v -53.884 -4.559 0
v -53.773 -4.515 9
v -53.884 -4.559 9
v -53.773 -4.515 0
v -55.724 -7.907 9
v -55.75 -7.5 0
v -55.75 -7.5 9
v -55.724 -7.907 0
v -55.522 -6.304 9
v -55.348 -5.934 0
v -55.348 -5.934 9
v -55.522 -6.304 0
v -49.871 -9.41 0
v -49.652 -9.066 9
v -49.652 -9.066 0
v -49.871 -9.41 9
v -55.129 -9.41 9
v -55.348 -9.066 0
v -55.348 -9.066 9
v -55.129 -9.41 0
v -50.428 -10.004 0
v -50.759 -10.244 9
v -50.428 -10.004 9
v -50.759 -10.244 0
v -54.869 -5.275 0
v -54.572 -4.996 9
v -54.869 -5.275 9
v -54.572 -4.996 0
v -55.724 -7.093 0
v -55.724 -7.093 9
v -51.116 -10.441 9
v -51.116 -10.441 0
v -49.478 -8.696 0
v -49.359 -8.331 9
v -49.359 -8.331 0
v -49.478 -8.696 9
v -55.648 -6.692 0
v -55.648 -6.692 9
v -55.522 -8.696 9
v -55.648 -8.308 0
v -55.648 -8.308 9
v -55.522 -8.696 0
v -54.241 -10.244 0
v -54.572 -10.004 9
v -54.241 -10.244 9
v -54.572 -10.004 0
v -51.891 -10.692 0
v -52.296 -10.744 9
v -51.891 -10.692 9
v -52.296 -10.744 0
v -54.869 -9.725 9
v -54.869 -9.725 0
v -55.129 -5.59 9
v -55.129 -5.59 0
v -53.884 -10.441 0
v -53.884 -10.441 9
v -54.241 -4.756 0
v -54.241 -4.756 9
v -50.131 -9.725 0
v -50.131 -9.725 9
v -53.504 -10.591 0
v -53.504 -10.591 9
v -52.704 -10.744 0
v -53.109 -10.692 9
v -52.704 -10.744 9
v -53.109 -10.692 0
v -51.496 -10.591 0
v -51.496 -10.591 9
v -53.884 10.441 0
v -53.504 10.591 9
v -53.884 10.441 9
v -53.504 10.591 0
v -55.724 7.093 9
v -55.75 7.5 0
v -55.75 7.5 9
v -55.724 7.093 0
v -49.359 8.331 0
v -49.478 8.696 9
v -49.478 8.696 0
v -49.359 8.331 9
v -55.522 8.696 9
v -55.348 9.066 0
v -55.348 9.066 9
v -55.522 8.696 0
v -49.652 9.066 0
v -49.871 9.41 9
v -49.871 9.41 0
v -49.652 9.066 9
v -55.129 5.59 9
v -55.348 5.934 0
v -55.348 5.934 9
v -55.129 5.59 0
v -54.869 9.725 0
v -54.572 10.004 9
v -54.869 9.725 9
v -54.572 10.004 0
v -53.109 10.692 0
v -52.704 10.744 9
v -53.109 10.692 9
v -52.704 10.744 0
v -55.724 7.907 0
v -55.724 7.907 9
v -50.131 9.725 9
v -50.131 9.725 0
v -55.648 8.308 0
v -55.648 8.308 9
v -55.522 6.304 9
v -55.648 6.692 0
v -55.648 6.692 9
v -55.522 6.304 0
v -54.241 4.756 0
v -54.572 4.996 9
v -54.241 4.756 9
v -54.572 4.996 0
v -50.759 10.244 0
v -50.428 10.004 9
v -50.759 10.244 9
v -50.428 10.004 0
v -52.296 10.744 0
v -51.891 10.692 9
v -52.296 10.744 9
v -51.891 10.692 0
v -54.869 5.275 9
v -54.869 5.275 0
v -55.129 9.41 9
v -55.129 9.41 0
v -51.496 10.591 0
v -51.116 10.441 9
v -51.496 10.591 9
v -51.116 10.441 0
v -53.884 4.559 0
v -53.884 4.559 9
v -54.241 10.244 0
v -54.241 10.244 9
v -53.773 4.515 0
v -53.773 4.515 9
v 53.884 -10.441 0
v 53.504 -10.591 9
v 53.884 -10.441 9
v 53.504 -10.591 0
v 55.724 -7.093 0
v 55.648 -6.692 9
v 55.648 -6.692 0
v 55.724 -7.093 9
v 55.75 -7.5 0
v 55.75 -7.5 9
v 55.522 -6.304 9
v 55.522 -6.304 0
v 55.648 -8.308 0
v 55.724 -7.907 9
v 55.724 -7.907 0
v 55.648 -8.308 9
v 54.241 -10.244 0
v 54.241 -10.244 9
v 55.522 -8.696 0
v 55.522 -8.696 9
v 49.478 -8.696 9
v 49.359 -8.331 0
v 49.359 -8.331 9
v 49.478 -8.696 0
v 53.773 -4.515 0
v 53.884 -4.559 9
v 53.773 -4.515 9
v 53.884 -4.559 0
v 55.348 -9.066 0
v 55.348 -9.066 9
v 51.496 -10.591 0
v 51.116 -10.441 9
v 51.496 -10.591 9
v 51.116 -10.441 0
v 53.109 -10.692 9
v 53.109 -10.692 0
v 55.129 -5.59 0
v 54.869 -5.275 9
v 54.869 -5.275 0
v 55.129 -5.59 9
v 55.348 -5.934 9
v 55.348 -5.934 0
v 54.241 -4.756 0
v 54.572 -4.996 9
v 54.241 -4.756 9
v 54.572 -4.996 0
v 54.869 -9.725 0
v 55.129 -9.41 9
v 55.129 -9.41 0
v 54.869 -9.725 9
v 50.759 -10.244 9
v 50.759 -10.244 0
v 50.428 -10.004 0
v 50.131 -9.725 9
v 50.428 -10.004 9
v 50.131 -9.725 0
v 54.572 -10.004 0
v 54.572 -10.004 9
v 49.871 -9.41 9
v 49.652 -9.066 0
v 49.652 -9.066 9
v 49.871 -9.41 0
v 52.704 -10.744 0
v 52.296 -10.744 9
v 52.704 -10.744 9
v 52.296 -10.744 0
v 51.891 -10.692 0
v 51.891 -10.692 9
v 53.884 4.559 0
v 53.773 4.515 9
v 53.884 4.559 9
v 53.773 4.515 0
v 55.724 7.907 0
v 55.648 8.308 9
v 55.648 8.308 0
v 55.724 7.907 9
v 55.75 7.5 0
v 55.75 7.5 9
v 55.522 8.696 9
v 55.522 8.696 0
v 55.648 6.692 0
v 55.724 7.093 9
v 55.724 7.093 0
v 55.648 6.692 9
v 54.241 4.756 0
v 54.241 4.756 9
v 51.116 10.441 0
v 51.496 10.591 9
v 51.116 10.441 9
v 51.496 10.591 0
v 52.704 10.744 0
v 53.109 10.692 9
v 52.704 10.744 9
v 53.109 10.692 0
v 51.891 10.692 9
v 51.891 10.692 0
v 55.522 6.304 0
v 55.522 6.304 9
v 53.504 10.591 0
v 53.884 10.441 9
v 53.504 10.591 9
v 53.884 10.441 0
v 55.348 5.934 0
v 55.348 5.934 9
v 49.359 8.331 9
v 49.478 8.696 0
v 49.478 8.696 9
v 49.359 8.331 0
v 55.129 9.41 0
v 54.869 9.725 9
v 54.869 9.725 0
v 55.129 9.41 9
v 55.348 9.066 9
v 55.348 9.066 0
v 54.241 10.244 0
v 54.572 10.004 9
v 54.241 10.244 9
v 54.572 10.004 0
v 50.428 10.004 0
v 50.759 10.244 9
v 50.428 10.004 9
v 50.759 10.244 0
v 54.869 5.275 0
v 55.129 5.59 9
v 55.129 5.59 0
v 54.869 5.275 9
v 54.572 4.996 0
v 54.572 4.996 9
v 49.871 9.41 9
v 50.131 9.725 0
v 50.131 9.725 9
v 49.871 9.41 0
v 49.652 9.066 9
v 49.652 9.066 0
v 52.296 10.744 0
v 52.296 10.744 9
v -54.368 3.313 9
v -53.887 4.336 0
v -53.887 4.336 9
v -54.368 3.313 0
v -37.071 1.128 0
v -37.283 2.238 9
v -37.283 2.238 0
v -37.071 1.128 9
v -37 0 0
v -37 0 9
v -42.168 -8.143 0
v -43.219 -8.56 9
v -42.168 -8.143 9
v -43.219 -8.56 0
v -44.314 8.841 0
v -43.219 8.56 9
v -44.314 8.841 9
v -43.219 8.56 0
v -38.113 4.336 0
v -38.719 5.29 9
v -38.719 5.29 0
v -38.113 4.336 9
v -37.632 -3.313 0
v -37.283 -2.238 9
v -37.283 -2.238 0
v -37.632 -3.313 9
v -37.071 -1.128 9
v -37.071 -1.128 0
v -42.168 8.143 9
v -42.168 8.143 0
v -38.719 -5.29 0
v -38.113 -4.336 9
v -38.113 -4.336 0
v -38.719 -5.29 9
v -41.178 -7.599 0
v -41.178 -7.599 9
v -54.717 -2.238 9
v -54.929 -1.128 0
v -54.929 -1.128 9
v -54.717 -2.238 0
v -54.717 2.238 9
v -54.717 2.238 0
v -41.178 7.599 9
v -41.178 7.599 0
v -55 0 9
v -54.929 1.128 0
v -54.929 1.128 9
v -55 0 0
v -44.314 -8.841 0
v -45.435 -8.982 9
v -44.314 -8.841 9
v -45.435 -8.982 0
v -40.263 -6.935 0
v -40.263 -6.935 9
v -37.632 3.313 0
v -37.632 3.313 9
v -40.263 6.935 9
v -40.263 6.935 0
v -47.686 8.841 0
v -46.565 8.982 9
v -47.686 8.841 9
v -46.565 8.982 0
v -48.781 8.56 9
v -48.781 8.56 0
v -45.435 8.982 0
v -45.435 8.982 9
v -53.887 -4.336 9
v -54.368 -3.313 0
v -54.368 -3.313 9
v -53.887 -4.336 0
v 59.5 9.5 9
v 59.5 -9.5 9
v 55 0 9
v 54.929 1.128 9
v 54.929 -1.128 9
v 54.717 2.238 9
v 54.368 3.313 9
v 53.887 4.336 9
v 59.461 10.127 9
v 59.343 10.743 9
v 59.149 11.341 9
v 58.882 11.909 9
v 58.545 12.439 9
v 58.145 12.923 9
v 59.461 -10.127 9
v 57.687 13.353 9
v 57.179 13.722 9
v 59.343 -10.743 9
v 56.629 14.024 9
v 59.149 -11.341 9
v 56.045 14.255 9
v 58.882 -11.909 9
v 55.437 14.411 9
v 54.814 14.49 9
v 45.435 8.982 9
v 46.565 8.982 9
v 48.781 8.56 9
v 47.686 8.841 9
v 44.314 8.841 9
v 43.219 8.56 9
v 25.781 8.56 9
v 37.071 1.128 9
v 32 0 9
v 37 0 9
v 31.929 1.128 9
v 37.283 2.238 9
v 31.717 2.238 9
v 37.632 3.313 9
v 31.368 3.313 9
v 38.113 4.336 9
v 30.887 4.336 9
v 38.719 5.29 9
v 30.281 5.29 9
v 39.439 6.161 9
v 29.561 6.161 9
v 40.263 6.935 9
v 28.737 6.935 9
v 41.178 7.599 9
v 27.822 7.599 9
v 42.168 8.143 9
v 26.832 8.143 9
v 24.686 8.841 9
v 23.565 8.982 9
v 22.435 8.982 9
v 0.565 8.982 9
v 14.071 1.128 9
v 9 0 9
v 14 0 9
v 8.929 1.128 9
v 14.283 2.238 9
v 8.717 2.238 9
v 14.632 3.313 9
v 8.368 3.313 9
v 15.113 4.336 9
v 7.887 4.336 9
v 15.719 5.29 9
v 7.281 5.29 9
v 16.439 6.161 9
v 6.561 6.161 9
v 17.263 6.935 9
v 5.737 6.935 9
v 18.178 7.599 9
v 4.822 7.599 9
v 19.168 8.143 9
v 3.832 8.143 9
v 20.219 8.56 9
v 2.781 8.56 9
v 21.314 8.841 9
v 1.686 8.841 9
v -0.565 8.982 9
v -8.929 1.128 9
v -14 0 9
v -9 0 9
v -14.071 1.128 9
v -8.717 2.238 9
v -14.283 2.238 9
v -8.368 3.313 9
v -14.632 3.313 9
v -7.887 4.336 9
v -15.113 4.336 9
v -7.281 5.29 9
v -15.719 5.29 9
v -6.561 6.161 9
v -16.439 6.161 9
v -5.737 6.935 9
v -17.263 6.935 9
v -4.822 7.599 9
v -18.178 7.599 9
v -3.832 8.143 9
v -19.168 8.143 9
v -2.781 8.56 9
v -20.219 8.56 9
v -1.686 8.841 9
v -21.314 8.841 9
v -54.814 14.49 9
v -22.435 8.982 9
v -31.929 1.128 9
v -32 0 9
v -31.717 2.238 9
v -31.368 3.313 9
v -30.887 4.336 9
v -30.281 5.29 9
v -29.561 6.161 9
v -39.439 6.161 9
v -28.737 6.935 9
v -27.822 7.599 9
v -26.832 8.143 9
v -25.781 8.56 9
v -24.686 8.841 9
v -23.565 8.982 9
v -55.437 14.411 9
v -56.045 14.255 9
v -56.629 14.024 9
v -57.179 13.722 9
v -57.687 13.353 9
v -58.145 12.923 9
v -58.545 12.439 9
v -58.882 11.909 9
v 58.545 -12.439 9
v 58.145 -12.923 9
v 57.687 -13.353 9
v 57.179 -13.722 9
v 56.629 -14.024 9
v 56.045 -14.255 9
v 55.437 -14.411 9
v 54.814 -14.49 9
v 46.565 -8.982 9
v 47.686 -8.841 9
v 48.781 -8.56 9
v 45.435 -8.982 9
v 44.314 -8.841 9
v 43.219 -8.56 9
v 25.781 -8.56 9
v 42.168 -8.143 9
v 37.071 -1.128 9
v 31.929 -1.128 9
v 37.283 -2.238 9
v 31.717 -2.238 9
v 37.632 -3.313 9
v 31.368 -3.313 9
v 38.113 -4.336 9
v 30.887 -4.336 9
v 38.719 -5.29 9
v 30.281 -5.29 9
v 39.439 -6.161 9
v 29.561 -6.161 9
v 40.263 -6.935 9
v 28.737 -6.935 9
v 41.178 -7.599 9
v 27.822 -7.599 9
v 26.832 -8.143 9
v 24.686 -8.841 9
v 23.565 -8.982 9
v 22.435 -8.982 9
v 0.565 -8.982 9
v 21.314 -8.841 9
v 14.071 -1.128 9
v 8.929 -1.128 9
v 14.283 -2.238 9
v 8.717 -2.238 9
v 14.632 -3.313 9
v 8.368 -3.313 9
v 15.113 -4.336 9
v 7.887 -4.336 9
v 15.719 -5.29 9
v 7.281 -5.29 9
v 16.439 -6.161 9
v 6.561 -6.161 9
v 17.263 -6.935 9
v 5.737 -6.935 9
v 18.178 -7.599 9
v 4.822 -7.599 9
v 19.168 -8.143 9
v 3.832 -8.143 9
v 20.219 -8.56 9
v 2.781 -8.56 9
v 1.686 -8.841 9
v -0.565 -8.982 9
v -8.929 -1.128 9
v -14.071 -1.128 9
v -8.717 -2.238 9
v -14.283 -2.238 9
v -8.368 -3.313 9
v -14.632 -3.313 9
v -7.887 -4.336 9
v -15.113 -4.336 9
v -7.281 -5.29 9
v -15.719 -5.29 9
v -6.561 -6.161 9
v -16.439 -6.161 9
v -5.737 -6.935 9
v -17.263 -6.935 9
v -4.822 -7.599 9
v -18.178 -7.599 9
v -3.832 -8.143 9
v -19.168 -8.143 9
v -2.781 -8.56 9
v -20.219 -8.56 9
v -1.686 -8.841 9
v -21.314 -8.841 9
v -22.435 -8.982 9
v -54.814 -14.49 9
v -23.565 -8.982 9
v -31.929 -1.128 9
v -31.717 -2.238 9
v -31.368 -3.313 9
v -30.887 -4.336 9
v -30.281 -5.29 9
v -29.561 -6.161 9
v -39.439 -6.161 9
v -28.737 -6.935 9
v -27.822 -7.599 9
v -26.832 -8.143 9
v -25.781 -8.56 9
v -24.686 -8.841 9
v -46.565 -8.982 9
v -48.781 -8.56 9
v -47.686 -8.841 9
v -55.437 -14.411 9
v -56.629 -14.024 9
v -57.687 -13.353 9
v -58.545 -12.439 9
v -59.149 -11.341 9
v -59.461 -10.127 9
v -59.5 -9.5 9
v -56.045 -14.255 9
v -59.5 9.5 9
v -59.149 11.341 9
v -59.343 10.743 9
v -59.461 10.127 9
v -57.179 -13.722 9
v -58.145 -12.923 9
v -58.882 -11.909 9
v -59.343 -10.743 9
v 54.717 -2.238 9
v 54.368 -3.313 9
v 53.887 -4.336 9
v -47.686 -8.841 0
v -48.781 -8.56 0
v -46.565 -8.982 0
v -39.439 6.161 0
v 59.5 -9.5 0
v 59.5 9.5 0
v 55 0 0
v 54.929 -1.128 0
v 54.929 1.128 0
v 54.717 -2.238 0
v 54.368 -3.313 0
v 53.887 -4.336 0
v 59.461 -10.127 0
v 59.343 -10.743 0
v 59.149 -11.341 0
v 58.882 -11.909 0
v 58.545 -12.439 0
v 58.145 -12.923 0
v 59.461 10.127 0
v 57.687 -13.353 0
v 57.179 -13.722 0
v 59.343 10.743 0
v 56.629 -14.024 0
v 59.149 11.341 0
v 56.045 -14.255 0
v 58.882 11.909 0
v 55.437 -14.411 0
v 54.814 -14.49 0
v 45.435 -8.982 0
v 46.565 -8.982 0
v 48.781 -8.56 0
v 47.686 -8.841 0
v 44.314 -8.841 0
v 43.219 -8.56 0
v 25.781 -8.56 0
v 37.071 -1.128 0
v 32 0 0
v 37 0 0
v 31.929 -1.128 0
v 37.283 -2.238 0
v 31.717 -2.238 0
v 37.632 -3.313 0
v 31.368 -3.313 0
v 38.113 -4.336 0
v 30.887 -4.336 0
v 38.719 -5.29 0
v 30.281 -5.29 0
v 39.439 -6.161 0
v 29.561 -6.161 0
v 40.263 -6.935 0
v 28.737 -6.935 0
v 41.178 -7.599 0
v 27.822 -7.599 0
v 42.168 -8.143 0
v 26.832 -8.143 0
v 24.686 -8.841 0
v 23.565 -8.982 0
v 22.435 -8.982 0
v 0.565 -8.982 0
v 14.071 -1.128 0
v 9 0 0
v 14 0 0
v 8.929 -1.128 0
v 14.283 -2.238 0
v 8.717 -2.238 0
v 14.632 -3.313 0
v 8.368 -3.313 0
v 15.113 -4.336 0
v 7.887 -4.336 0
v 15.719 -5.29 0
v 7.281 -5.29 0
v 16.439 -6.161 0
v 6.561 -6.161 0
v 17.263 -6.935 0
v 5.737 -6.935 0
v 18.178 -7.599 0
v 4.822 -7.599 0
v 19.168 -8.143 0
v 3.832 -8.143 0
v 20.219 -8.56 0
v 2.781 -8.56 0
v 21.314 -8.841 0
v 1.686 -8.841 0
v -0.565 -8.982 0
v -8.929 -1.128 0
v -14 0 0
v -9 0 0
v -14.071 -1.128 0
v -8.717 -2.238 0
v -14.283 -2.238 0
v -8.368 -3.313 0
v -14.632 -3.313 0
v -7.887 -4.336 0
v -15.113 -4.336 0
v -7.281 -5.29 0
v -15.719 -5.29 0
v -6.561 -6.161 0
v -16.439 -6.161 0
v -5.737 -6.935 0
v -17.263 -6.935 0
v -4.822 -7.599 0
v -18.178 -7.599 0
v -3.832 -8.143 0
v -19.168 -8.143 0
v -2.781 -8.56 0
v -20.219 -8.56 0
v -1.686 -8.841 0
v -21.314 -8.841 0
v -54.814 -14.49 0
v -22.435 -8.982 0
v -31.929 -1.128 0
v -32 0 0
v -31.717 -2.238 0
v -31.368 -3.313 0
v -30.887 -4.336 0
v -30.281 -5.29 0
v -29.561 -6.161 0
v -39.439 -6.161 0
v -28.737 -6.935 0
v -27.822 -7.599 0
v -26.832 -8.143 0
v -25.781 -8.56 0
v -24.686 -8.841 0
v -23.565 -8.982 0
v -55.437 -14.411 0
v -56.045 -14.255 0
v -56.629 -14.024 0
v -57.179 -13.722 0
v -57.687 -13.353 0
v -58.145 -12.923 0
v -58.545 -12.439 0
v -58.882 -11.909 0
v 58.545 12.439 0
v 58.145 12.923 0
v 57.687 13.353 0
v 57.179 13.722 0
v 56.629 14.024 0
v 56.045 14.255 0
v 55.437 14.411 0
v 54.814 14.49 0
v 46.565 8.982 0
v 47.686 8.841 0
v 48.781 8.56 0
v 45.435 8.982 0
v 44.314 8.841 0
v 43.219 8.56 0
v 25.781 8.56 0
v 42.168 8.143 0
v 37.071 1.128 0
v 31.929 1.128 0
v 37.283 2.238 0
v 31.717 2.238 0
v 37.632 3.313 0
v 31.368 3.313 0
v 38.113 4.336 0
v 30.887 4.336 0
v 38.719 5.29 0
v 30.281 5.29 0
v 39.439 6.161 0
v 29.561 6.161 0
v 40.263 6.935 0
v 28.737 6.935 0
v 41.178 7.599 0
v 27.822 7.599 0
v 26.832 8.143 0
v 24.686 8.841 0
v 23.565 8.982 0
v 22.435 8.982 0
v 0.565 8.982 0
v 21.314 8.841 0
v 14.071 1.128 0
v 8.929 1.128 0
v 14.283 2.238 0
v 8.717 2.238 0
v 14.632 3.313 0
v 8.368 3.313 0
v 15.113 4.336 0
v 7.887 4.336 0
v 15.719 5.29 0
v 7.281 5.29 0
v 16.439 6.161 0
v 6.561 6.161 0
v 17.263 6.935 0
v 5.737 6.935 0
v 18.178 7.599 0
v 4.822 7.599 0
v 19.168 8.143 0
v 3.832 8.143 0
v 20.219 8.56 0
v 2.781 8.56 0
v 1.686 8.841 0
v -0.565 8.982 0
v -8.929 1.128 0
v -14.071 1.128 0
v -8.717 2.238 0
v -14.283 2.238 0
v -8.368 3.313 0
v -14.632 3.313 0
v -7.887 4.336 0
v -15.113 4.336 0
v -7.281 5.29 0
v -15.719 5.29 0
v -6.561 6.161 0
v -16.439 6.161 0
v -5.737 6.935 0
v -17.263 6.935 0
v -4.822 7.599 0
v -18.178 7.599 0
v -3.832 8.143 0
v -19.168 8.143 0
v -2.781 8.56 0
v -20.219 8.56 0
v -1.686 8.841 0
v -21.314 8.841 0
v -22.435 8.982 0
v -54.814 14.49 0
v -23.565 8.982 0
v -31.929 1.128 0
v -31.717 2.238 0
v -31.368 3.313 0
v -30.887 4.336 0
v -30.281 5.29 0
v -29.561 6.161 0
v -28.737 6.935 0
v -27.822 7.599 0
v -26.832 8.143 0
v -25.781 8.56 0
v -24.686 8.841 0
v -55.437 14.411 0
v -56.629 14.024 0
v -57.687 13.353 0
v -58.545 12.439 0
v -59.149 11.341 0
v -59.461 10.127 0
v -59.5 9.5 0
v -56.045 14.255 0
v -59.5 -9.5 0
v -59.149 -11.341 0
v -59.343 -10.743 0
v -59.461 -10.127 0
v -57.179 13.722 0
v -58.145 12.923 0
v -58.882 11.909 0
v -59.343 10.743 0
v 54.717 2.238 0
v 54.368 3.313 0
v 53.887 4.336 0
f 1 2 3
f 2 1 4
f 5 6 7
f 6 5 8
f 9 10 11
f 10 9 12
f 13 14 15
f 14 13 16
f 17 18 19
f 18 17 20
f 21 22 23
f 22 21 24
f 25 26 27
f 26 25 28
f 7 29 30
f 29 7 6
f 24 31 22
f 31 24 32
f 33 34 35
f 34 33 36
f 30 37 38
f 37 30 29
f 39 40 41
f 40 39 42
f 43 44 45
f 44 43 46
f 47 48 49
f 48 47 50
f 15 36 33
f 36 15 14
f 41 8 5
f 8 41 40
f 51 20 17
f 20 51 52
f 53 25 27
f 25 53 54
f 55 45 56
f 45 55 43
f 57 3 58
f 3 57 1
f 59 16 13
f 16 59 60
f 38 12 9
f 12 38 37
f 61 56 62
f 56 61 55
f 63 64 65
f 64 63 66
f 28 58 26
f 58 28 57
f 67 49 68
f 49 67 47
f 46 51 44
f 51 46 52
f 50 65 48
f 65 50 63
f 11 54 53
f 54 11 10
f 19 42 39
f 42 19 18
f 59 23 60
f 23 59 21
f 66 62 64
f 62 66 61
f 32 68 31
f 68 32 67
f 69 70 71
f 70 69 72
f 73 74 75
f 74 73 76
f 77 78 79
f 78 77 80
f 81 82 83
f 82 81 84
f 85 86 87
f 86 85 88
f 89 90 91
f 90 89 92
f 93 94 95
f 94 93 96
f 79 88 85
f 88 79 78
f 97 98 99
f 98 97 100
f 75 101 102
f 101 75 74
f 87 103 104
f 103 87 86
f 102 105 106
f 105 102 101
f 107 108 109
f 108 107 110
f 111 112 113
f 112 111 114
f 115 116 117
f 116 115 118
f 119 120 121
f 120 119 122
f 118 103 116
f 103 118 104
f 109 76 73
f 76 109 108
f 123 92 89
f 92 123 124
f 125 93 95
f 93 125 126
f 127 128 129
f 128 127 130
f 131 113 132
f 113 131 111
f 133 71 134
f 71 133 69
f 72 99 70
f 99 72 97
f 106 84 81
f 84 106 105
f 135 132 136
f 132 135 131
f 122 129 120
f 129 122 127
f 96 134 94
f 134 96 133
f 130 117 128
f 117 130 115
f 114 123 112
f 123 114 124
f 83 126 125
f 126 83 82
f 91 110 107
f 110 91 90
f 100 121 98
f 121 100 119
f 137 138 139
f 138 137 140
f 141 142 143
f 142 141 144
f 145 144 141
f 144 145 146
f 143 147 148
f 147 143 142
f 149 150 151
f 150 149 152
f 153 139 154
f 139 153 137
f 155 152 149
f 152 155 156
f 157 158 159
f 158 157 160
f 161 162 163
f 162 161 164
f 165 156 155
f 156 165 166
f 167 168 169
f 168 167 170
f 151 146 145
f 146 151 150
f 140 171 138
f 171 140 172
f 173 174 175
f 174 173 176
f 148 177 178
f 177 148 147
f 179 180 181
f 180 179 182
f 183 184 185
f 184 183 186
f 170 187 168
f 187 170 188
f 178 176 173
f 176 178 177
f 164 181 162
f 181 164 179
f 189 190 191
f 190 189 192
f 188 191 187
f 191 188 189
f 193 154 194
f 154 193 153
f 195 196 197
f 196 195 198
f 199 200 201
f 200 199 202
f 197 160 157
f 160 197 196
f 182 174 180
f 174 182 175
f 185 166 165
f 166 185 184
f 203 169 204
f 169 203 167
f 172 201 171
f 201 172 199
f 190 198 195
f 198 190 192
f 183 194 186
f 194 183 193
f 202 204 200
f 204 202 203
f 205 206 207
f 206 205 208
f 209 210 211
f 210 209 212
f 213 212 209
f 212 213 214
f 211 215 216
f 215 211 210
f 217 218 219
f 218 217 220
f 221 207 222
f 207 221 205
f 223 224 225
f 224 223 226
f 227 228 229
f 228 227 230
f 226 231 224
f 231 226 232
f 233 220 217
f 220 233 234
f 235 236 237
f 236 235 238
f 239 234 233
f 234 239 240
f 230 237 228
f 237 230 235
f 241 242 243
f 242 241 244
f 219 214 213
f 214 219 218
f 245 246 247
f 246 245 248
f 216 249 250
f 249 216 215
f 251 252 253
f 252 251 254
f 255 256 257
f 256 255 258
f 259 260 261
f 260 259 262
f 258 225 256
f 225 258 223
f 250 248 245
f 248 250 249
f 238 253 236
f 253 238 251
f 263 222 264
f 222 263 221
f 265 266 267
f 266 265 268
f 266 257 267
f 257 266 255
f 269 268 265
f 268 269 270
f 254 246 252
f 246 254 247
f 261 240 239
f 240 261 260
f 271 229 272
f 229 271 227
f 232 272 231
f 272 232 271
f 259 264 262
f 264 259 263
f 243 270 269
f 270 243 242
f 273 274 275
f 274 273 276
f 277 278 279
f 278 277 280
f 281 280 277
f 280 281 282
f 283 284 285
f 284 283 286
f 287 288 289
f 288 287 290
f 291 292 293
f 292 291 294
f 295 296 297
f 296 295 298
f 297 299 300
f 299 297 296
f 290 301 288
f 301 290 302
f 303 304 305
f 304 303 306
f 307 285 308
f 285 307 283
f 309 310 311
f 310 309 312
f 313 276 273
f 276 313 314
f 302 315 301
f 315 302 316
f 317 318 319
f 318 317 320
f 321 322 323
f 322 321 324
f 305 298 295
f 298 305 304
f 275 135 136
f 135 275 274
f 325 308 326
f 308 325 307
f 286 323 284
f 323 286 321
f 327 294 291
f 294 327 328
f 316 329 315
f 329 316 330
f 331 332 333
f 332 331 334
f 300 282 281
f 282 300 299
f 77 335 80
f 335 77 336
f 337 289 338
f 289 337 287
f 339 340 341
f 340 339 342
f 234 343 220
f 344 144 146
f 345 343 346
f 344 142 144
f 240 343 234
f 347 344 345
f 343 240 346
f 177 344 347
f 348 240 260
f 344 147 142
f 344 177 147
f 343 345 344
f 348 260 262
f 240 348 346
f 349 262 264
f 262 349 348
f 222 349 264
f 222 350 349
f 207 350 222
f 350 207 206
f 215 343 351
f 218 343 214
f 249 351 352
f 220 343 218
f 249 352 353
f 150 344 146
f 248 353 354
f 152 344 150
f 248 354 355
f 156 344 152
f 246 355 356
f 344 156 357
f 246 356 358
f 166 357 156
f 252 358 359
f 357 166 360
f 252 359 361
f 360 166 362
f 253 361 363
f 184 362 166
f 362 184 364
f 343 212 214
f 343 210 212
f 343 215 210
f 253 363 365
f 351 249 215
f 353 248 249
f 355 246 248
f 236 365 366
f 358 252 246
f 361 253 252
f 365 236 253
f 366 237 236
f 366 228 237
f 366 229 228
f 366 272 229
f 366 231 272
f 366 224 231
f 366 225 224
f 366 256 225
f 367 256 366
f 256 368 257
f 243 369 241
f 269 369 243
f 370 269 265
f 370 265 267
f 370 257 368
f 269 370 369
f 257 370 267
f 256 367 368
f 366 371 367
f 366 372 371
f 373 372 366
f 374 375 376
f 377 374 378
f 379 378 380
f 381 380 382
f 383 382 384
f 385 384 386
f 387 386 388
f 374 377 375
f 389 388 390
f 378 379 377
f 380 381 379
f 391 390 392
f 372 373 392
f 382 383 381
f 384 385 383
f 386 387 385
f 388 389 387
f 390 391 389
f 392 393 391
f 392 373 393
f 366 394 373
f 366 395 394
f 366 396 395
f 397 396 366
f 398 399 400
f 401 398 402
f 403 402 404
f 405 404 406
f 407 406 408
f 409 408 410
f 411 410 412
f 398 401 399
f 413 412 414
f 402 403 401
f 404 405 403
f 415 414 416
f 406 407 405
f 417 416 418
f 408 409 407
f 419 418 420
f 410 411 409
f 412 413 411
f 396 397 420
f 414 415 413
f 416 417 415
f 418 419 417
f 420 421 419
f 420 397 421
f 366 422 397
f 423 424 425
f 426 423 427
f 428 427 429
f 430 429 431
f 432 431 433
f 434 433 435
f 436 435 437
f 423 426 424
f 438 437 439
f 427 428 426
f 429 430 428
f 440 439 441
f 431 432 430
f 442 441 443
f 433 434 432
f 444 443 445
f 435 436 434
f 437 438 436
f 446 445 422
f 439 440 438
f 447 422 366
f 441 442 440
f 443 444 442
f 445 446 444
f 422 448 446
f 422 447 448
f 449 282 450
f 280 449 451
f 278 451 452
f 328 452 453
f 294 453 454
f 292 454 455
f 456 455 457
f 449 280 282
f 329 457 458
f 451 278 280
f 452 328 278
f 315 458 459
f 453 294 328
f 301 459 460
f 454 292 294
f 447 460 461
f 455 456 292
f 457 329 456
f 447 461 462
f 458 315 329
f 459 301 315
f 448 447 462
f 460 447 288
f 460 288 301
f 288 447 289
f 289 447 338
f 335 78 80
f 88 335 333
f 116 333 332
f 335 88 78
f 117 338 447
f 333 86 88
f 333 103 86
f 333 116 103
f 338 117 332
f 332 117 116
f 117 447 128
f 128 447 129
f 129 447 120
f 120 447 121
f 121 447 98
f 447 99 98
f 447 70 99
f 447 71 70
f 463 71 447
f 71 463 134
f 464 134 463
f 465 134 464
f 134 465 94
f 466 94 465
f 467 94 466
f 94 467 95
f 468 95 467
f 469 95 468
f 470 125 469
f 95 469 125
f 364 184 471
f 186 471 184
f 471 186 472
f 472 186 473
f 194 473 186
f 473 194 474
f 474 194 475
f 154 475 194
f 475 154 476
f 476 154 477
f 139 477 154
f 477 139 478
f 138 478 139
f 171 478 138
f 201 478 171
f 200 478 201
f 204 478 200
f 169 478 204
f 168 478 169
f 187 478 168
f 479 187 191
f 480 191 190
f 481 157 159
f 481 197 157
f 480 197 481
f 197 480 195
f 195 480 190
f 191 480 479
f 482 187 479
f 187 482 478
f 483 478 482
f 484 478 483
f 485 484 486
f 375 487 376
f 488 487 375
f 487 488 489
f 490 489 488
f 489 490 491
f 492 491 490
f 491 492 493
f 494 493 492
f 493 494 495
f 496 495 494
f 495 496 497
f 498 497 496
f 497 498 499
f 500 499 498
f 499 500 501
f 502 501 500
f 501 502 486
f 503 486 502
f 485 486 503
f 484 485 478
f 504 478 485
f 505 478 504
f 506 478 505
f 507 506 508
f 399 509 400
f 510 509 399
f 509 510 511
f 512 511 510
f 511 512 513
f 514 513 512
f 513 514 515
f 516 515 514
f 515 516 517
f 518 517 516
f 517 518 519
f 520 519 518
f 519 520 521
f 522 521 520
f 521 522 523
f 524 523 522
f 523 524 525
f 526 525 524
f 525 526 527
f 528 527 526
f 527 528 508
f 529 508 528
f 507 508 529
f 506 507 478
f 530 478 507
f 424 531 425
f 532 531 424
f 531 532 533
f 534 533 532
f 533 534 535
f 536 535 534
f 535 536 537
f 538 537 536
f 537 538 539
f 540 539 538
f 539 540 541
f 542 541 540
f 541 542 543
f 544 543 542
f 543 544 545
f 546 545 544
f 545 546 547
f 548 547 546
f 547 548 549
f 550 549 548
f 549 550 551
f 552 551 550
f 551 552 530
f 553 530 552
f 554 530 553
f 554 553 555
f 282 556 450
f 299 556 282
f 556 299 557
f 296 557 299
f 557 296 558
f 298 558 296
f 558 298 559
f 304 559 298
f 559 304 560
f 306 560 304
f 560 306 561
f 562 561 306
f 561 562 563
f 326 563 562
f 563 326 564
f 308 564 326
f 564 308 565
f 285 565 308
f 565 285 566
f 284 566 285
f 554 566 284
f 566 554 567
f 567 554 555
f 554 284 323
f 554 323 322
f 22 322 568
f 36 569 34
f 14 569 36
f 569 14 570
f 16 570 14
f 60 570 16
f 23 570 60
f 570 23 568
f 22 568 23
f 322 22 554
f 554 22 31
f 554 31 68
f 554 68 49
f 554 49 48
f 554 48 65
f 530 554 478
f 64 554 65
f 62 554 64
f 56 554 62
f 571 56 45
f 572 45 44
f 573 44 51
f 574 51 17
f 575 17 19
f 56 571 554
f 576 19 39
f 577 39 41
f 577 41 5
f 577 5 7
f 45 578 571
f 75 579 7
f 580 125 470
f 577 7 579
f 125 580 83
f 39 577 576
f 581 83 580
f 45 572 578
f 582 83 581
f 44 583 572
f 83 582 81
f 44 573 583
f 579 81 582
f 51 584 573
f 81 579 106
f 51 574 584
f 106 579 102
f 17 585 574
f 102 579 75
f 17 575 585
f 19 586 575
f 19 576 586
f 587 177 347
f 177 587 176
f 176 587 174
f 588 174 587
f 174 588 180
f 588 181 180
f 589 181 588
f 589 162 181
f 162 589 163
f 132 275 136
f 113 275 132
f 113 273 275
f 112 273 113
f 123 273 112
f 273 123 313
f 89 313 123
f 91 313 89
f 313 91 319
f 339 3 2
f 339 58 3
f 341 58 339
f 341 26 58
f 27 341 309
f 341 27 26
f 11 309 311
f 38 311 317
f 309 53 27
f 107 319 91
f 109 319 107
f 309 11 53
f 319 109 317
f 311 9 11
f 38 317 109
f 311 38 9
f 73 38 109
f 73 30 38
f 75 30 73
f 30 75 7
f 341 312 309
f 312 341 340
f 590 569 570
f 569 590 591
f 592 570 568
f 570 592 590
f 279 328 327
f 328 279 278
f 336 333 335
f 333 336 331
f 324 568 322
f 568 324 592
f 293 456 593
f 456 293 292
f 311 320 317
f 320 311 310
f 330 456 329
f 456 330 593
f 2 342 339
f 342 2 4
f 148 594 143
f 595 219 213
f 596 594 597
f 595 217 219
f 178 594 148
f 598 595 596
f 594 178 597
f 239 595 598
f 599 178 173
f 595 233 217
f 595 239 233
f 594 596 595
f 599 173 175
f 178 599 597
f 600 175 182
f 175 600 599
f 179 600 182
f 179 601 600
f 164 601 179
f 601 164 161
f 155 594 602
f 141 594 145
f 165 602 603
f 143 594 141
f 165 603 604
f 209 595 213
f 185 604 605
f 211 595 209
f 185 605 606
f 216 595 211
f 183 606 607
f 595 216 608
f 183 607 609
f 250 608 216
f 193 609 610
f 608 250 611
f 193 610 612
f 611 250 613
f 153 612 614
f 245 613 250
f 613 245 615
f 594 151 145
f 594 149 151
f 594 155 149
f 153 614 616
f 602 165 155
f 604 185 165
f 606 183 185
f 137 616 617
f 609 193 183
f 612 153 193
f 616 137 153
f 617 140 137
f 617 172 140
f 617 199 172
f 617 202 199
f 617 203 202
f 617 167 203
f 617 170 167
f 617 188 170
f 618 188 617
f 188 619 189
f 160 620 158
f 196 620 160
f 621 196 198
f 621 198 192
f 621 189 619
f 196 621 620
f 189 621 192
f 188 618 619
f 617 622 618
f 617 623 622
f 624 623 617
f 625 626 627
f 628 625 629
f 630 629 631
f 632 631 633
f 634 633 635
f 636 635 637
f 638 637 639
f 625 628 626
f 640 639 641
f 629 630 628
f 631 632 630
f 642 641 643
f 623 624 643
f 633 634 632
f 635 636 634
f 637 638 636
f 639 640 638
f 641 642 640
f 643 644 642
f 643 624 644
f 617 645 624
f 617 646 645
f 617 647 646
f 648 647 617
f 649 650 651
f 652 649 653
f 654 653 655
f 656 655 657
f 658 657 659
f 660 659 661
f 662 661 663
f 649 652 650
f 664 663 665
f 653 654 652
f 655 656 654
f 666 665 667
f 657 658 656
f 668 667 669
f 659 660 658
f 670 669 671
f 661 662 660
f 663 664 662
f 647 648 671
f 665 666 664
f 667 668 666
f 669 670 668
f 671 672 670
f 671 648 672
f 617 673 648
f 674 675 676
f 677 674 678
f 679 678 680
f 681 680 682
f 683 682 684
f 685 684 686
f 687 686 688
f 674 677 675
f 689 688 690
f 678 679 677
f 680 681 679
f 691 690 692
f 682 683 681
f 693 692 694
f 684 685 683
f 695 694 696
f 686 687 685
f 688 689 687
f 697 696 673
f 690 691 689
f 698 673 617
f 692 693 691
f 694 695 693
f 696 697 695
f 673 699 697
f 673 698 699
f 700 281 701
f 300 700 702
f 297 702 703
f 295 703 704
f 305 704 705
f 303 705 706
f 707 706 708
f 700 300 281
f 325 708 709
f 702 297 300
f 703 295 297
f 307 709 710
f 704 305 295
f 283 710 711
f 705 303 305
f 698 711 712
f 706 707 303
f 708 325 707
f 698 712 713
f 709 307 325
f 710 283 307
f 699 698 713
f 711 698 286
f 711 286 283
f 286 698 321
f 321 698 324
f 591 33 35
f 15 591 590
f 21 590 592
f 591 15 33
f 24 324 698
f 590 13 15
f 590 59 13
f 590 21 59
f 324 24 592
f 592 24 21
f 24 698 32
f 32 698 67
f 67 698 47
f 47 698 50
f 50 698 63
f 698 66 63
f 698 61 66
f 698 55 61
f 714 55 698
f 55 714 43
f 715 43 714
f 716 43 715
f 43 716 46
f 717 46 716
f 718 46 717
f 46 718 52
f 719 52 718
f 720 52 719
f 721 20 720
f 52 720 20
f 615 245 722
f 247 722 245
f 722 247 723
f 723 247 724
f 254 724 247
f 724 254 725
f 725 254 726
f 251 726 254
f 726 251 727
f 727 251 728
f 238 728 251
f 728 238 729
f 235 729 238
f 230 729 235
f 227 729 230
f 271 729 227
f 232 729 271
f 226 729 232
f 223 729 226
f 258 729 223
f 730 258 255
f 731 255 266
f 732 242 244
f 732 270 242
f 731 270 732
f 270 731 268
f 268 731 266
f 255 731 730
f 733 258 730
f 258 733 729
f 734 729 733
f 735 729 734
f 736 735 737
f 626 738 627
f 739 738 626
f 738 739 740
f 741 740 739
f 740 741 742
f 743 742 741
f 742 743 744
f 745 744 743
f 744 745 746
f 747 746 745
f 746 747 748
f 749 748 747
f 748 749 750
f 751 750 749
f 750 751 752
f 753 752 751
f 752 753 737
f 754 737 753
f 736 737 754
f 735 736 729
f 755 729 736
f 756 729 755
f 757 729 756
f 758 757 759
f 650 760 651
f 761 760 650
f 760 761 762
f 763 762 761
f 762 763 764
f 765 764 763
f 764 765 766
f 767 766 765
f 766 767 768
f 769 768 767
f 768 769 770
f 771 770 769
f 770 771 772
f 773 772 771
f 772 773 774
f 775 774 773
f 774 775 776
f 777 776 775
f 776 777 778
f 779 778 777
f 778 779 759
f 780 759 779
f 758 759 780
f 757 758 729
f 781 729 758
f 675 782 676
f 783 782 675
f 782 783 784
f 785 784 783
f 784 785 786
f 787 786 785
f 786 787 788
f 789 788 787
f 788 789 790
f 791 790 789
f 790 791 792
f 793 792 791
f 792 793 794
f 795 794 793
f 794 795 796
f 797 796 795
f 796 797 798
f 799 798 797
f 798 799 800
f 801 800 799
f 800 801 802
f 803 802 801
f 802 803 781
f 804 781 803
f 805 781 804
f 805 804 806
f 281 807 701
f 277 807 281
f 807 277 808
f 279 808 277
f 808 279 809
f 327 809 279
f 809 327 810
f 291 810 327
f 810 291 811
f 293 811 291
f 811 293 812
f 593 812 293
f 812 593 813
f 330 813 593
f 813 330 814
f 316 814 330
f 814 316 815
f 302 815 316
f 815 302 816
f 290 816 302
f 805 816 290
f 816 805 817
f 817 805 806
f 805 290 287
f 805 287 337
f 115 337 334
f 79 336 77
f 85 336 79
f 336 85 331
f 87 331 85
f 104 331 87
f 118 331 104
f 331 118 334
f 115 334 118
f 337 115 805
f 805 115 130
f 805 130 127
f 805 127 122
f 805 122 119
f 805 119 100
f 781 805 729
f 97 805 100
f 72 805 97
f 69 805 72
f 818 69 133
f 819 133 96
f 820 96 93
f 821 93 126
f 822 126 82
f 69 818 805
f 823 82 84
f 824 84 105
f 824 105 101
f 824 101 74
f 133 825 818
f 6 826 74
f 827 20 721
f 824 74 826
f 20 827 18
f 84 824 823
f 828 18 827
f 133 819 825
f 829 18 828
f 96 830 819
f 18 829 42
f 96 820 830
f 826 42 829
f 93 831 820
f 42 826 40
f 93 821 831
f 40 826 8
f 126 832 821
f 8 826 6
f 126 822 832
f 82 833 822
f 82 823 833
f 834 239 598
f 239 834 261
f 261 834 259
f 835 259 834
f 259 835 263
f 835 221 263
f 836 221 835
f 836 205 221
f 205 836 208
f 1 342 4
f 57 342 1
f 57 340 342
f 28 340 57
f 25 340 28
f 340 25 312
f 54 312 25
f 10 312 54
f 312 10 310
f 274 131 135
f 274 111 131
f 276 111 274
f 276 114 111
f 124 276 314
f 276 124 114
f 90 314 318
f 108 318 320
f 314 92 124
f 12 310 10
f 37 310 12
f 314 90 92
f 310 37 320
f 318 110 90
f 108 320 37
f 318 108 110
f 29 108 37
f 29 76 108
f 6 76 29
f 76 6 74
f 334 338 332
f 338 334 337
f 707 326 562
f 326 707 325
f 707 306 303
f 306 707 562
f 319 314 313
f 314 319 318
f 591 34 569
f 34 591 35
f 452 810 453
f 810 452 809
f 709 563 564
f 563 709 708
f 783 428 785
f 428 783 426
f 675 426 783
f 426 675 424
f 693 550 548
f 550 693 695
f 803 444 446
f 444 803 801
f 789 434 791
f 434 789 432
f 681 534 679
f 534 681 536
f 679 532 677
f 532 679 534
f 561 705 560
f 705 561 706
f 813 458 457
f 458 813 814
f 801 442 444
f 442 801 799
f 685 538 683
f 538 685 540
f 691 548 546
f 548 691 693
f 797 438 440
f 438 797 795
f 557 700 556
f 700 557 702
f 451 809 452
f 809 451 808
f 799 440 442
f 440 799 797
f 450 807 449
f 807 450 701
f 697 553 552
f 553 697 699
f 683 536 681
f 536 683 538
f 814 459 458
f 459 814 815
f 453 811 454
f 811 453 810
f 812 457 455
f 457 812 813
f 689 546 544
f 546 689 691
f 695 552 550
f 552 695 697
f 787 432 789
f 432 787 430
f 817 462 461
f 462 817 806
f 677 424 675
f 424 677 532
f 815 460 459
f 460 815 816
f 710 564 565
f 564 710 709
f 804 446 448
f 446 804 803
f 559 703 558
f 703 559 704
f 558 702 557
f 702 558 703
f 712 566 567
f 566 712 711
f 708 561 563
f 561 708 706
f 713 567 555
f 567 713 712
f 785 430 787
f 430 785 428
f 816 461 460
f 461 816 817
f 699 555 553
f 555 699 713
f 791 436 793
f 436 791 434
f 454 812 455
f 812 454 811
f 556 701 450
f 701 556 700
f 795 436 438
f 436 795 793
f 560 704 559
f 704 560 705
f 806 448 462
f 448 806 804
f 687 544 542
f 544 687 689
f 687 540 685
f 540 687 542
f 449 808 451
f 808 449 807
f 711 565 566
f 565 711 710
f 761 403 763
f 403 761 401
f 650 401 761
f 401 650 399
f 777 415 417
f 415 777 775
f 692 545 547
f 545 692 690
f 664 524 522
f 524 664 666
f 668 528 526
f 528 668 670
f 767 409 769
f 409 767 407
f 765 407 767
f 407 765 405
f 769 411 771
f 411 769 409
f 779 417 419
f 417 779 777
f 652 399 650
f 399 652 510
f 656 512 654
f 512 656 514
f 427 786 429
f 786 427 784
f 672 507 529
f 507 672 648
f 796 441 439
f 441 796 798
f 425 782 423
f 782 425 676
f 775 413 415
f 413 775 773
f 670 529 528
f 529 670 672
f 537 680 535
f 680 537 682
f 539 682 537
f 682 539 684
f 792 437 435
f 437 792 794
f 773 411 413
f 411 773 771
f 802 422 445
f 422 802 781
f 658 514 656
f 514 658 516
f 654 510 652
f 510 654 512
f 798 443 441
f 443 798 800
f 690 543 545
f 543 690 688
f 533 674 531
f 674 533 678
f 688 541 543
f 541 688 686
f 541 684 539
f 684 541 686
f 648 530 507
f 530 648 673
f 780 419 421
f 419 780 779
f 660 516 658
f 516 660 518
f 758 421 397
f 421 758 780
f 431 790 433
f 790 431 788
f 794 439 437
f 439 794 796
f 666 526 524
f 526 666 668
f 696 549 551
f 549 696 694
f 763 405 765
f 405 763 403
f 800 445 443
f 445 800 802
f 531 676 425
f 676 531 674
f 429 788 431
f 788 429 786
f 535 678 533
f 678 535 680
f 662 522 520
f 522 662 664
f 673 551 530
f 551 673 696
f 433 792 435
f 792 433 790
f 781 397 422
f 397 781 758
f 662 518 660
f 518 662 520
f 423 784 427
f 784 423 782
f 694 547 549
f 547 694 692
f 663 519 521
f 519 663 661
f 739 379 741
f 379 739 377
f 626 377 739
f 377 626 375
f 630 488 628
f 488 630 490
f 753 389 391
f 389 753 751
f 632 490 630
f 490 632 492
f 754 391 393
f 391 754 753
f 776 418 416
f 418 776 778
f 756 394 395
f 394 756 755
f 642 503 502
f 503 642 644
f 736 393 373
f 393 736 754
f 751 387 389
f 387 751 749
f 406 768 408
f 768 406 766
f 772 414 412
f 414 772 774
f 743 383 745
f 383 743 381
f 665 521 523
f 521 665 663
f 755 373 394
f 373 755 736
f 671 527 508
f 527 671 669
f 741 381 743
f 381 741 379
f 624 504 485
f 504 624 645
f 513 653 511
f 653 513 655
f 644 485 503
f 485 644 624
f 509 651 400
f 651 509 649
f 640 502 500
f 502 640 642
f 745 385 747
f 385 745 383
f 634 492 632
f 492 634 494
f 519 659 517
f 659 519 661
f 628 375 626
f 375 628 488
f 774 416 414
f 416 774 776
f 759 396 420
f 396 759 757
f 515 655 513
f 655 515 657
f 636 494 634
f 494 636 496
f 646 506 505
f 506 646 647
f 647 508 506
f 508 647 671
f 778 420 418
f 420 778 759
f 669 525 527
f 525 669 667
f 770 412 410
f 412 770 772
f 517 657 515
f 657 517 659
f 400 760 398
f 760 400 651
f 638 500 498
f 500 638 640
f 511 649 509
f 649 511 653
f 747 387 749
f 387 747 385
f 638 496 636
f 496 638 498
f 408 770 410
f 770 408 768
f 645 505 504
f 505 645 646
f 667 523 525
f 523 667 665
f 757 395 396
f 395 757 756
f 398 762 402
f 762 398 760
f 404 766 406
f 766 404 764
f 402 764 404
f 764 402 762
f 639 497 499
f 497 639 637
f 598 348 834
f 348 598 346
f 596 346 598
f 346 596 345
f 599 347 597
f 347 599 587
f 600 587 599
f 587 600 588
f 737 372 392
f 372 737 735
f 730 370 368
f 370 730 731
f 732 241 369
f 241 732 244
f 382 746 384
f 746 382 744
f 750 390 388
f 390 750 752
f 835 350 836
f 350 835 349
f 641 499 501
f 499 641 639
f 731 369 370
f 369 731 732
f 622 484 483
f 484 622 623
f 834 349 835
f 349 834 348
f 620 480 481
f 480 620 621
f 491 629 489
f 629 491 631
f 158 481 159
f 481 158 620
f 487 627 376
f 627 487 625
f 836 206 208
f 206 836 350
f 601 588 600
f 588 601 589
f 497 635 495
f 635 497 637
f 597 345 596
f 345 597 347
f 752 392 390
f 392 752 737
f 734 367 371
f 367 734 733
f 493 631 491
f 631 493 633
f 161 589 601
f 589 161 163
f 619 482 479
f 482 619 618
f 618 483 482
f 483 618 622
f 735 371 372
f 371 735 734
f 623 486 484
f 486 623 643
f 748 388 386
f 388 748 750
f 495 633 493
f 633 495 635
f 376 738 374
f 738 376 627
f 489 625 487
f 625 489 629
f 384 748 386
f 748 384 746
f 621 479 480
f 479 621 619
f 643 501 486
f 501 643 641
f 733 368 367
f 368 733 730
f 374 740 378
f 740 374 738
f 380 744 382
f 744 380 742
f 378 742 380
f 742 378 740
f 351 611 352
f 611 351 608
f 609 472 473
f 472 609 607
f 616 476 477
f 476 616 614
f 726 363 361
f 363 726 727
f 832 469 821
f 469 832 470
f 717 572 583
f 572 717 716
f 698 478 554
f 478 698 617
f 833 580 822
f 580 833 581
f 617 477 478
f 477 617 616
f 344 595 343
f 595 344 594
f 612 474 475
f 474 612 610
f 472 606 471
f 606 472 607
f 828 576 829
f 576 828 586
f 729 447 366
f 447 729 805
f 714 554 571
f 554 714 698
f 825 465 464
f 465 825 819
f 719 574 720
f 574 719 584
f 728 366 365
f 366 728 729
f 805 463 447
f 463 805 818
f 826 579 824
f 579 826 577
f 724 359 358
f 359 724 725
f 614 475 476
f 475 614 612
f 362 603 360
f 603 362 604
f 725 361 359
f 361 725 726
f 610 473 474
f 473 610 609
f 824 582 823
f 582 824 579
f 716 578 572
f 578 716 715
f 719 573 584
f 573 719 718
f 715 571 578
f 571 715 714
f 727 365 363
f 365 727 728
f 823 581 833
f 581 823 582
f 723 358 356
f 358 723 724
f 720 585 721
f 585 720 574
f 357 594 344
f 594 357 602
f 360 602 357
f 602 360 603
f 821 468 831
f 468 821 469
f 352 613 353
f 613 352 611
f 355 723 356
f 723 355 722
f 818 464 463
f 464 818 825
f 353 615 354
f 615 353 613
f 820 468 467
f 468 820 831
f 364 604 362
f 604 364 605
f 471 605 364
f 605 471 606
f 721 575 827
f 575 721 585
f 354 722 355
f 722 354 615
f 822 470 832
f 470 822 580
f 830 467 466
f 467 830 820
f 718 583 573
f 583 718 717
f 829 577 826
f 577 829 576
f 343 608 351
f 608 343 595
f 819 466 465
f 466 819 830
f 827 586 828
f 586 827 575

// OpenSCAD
$fn = 50;

difference() {
	union() {
		hull() {
			translate(v = [-54.5, 9.5, 0]) {
				cylinder(h = 9, r = 5);
			}
			translate(v = [54.5, 9.5, 0]) {
				cylinder(h = 9, r = 5);
			}
			translate(v = [-54.5, -9.5, 0]) {
				cylinder(h = 9, r = 5);
			}
			translate(v = [54.5, -9.5, 0]) {
				cylinder(h = 9, r = 5);
			}
		}
	}
	union() {
		translate(v = [-52.5, -7.5, -100.0]) {
			cylinder(h = 200, r = 3.25);
		}
		translate(v = [-52.5, 7.5, -100.0]) {
			cylinder(h = 200, r = 3.25);
		}
		translate(v = [52.5, -7.5, -100.0]) {
			cylinder(h = 200, r = 3.25);
		}
		translate(v = [52.5, 7.5, -100.0]) {
			cylinder(h = 200, r = 3.25);
		}
		translate(v = [-52.5, -7.5, -100.0]) {
			cylinder(h = 200, r = 1.8);
		}
		translate(v = [-52.5, 7.5, -100.0]) {
			cylinder(h = 200, r = 1.8);
		}
		translate(v = [52.5, -7.5, -100.0]) {
			cylinder(h = 200, r = 1.8);
		}
		translate(v = [52.5, 7.5, -100.0]) {
			cylinder(h = 200, r = 1.8);
		}
		translate(v = [-46.0, 0, 0.0]) {
			cylinder(h = 9, r = 9.0);
		}
		translate(v = [-23.0, 0, 0.0]) {
			cylinder(h = 9, r = 9.0);
		}
		cylinder(h = 9, r = 9.0);
		translate(v = [23.0, 0, 0.0]) {
			cylinder(h = 9, r = 9.0);
		}
		translate(v = [46.0, 0, 0.0]) {
			cylinder(h = 9, r = 9.0);
		}
	}
}
